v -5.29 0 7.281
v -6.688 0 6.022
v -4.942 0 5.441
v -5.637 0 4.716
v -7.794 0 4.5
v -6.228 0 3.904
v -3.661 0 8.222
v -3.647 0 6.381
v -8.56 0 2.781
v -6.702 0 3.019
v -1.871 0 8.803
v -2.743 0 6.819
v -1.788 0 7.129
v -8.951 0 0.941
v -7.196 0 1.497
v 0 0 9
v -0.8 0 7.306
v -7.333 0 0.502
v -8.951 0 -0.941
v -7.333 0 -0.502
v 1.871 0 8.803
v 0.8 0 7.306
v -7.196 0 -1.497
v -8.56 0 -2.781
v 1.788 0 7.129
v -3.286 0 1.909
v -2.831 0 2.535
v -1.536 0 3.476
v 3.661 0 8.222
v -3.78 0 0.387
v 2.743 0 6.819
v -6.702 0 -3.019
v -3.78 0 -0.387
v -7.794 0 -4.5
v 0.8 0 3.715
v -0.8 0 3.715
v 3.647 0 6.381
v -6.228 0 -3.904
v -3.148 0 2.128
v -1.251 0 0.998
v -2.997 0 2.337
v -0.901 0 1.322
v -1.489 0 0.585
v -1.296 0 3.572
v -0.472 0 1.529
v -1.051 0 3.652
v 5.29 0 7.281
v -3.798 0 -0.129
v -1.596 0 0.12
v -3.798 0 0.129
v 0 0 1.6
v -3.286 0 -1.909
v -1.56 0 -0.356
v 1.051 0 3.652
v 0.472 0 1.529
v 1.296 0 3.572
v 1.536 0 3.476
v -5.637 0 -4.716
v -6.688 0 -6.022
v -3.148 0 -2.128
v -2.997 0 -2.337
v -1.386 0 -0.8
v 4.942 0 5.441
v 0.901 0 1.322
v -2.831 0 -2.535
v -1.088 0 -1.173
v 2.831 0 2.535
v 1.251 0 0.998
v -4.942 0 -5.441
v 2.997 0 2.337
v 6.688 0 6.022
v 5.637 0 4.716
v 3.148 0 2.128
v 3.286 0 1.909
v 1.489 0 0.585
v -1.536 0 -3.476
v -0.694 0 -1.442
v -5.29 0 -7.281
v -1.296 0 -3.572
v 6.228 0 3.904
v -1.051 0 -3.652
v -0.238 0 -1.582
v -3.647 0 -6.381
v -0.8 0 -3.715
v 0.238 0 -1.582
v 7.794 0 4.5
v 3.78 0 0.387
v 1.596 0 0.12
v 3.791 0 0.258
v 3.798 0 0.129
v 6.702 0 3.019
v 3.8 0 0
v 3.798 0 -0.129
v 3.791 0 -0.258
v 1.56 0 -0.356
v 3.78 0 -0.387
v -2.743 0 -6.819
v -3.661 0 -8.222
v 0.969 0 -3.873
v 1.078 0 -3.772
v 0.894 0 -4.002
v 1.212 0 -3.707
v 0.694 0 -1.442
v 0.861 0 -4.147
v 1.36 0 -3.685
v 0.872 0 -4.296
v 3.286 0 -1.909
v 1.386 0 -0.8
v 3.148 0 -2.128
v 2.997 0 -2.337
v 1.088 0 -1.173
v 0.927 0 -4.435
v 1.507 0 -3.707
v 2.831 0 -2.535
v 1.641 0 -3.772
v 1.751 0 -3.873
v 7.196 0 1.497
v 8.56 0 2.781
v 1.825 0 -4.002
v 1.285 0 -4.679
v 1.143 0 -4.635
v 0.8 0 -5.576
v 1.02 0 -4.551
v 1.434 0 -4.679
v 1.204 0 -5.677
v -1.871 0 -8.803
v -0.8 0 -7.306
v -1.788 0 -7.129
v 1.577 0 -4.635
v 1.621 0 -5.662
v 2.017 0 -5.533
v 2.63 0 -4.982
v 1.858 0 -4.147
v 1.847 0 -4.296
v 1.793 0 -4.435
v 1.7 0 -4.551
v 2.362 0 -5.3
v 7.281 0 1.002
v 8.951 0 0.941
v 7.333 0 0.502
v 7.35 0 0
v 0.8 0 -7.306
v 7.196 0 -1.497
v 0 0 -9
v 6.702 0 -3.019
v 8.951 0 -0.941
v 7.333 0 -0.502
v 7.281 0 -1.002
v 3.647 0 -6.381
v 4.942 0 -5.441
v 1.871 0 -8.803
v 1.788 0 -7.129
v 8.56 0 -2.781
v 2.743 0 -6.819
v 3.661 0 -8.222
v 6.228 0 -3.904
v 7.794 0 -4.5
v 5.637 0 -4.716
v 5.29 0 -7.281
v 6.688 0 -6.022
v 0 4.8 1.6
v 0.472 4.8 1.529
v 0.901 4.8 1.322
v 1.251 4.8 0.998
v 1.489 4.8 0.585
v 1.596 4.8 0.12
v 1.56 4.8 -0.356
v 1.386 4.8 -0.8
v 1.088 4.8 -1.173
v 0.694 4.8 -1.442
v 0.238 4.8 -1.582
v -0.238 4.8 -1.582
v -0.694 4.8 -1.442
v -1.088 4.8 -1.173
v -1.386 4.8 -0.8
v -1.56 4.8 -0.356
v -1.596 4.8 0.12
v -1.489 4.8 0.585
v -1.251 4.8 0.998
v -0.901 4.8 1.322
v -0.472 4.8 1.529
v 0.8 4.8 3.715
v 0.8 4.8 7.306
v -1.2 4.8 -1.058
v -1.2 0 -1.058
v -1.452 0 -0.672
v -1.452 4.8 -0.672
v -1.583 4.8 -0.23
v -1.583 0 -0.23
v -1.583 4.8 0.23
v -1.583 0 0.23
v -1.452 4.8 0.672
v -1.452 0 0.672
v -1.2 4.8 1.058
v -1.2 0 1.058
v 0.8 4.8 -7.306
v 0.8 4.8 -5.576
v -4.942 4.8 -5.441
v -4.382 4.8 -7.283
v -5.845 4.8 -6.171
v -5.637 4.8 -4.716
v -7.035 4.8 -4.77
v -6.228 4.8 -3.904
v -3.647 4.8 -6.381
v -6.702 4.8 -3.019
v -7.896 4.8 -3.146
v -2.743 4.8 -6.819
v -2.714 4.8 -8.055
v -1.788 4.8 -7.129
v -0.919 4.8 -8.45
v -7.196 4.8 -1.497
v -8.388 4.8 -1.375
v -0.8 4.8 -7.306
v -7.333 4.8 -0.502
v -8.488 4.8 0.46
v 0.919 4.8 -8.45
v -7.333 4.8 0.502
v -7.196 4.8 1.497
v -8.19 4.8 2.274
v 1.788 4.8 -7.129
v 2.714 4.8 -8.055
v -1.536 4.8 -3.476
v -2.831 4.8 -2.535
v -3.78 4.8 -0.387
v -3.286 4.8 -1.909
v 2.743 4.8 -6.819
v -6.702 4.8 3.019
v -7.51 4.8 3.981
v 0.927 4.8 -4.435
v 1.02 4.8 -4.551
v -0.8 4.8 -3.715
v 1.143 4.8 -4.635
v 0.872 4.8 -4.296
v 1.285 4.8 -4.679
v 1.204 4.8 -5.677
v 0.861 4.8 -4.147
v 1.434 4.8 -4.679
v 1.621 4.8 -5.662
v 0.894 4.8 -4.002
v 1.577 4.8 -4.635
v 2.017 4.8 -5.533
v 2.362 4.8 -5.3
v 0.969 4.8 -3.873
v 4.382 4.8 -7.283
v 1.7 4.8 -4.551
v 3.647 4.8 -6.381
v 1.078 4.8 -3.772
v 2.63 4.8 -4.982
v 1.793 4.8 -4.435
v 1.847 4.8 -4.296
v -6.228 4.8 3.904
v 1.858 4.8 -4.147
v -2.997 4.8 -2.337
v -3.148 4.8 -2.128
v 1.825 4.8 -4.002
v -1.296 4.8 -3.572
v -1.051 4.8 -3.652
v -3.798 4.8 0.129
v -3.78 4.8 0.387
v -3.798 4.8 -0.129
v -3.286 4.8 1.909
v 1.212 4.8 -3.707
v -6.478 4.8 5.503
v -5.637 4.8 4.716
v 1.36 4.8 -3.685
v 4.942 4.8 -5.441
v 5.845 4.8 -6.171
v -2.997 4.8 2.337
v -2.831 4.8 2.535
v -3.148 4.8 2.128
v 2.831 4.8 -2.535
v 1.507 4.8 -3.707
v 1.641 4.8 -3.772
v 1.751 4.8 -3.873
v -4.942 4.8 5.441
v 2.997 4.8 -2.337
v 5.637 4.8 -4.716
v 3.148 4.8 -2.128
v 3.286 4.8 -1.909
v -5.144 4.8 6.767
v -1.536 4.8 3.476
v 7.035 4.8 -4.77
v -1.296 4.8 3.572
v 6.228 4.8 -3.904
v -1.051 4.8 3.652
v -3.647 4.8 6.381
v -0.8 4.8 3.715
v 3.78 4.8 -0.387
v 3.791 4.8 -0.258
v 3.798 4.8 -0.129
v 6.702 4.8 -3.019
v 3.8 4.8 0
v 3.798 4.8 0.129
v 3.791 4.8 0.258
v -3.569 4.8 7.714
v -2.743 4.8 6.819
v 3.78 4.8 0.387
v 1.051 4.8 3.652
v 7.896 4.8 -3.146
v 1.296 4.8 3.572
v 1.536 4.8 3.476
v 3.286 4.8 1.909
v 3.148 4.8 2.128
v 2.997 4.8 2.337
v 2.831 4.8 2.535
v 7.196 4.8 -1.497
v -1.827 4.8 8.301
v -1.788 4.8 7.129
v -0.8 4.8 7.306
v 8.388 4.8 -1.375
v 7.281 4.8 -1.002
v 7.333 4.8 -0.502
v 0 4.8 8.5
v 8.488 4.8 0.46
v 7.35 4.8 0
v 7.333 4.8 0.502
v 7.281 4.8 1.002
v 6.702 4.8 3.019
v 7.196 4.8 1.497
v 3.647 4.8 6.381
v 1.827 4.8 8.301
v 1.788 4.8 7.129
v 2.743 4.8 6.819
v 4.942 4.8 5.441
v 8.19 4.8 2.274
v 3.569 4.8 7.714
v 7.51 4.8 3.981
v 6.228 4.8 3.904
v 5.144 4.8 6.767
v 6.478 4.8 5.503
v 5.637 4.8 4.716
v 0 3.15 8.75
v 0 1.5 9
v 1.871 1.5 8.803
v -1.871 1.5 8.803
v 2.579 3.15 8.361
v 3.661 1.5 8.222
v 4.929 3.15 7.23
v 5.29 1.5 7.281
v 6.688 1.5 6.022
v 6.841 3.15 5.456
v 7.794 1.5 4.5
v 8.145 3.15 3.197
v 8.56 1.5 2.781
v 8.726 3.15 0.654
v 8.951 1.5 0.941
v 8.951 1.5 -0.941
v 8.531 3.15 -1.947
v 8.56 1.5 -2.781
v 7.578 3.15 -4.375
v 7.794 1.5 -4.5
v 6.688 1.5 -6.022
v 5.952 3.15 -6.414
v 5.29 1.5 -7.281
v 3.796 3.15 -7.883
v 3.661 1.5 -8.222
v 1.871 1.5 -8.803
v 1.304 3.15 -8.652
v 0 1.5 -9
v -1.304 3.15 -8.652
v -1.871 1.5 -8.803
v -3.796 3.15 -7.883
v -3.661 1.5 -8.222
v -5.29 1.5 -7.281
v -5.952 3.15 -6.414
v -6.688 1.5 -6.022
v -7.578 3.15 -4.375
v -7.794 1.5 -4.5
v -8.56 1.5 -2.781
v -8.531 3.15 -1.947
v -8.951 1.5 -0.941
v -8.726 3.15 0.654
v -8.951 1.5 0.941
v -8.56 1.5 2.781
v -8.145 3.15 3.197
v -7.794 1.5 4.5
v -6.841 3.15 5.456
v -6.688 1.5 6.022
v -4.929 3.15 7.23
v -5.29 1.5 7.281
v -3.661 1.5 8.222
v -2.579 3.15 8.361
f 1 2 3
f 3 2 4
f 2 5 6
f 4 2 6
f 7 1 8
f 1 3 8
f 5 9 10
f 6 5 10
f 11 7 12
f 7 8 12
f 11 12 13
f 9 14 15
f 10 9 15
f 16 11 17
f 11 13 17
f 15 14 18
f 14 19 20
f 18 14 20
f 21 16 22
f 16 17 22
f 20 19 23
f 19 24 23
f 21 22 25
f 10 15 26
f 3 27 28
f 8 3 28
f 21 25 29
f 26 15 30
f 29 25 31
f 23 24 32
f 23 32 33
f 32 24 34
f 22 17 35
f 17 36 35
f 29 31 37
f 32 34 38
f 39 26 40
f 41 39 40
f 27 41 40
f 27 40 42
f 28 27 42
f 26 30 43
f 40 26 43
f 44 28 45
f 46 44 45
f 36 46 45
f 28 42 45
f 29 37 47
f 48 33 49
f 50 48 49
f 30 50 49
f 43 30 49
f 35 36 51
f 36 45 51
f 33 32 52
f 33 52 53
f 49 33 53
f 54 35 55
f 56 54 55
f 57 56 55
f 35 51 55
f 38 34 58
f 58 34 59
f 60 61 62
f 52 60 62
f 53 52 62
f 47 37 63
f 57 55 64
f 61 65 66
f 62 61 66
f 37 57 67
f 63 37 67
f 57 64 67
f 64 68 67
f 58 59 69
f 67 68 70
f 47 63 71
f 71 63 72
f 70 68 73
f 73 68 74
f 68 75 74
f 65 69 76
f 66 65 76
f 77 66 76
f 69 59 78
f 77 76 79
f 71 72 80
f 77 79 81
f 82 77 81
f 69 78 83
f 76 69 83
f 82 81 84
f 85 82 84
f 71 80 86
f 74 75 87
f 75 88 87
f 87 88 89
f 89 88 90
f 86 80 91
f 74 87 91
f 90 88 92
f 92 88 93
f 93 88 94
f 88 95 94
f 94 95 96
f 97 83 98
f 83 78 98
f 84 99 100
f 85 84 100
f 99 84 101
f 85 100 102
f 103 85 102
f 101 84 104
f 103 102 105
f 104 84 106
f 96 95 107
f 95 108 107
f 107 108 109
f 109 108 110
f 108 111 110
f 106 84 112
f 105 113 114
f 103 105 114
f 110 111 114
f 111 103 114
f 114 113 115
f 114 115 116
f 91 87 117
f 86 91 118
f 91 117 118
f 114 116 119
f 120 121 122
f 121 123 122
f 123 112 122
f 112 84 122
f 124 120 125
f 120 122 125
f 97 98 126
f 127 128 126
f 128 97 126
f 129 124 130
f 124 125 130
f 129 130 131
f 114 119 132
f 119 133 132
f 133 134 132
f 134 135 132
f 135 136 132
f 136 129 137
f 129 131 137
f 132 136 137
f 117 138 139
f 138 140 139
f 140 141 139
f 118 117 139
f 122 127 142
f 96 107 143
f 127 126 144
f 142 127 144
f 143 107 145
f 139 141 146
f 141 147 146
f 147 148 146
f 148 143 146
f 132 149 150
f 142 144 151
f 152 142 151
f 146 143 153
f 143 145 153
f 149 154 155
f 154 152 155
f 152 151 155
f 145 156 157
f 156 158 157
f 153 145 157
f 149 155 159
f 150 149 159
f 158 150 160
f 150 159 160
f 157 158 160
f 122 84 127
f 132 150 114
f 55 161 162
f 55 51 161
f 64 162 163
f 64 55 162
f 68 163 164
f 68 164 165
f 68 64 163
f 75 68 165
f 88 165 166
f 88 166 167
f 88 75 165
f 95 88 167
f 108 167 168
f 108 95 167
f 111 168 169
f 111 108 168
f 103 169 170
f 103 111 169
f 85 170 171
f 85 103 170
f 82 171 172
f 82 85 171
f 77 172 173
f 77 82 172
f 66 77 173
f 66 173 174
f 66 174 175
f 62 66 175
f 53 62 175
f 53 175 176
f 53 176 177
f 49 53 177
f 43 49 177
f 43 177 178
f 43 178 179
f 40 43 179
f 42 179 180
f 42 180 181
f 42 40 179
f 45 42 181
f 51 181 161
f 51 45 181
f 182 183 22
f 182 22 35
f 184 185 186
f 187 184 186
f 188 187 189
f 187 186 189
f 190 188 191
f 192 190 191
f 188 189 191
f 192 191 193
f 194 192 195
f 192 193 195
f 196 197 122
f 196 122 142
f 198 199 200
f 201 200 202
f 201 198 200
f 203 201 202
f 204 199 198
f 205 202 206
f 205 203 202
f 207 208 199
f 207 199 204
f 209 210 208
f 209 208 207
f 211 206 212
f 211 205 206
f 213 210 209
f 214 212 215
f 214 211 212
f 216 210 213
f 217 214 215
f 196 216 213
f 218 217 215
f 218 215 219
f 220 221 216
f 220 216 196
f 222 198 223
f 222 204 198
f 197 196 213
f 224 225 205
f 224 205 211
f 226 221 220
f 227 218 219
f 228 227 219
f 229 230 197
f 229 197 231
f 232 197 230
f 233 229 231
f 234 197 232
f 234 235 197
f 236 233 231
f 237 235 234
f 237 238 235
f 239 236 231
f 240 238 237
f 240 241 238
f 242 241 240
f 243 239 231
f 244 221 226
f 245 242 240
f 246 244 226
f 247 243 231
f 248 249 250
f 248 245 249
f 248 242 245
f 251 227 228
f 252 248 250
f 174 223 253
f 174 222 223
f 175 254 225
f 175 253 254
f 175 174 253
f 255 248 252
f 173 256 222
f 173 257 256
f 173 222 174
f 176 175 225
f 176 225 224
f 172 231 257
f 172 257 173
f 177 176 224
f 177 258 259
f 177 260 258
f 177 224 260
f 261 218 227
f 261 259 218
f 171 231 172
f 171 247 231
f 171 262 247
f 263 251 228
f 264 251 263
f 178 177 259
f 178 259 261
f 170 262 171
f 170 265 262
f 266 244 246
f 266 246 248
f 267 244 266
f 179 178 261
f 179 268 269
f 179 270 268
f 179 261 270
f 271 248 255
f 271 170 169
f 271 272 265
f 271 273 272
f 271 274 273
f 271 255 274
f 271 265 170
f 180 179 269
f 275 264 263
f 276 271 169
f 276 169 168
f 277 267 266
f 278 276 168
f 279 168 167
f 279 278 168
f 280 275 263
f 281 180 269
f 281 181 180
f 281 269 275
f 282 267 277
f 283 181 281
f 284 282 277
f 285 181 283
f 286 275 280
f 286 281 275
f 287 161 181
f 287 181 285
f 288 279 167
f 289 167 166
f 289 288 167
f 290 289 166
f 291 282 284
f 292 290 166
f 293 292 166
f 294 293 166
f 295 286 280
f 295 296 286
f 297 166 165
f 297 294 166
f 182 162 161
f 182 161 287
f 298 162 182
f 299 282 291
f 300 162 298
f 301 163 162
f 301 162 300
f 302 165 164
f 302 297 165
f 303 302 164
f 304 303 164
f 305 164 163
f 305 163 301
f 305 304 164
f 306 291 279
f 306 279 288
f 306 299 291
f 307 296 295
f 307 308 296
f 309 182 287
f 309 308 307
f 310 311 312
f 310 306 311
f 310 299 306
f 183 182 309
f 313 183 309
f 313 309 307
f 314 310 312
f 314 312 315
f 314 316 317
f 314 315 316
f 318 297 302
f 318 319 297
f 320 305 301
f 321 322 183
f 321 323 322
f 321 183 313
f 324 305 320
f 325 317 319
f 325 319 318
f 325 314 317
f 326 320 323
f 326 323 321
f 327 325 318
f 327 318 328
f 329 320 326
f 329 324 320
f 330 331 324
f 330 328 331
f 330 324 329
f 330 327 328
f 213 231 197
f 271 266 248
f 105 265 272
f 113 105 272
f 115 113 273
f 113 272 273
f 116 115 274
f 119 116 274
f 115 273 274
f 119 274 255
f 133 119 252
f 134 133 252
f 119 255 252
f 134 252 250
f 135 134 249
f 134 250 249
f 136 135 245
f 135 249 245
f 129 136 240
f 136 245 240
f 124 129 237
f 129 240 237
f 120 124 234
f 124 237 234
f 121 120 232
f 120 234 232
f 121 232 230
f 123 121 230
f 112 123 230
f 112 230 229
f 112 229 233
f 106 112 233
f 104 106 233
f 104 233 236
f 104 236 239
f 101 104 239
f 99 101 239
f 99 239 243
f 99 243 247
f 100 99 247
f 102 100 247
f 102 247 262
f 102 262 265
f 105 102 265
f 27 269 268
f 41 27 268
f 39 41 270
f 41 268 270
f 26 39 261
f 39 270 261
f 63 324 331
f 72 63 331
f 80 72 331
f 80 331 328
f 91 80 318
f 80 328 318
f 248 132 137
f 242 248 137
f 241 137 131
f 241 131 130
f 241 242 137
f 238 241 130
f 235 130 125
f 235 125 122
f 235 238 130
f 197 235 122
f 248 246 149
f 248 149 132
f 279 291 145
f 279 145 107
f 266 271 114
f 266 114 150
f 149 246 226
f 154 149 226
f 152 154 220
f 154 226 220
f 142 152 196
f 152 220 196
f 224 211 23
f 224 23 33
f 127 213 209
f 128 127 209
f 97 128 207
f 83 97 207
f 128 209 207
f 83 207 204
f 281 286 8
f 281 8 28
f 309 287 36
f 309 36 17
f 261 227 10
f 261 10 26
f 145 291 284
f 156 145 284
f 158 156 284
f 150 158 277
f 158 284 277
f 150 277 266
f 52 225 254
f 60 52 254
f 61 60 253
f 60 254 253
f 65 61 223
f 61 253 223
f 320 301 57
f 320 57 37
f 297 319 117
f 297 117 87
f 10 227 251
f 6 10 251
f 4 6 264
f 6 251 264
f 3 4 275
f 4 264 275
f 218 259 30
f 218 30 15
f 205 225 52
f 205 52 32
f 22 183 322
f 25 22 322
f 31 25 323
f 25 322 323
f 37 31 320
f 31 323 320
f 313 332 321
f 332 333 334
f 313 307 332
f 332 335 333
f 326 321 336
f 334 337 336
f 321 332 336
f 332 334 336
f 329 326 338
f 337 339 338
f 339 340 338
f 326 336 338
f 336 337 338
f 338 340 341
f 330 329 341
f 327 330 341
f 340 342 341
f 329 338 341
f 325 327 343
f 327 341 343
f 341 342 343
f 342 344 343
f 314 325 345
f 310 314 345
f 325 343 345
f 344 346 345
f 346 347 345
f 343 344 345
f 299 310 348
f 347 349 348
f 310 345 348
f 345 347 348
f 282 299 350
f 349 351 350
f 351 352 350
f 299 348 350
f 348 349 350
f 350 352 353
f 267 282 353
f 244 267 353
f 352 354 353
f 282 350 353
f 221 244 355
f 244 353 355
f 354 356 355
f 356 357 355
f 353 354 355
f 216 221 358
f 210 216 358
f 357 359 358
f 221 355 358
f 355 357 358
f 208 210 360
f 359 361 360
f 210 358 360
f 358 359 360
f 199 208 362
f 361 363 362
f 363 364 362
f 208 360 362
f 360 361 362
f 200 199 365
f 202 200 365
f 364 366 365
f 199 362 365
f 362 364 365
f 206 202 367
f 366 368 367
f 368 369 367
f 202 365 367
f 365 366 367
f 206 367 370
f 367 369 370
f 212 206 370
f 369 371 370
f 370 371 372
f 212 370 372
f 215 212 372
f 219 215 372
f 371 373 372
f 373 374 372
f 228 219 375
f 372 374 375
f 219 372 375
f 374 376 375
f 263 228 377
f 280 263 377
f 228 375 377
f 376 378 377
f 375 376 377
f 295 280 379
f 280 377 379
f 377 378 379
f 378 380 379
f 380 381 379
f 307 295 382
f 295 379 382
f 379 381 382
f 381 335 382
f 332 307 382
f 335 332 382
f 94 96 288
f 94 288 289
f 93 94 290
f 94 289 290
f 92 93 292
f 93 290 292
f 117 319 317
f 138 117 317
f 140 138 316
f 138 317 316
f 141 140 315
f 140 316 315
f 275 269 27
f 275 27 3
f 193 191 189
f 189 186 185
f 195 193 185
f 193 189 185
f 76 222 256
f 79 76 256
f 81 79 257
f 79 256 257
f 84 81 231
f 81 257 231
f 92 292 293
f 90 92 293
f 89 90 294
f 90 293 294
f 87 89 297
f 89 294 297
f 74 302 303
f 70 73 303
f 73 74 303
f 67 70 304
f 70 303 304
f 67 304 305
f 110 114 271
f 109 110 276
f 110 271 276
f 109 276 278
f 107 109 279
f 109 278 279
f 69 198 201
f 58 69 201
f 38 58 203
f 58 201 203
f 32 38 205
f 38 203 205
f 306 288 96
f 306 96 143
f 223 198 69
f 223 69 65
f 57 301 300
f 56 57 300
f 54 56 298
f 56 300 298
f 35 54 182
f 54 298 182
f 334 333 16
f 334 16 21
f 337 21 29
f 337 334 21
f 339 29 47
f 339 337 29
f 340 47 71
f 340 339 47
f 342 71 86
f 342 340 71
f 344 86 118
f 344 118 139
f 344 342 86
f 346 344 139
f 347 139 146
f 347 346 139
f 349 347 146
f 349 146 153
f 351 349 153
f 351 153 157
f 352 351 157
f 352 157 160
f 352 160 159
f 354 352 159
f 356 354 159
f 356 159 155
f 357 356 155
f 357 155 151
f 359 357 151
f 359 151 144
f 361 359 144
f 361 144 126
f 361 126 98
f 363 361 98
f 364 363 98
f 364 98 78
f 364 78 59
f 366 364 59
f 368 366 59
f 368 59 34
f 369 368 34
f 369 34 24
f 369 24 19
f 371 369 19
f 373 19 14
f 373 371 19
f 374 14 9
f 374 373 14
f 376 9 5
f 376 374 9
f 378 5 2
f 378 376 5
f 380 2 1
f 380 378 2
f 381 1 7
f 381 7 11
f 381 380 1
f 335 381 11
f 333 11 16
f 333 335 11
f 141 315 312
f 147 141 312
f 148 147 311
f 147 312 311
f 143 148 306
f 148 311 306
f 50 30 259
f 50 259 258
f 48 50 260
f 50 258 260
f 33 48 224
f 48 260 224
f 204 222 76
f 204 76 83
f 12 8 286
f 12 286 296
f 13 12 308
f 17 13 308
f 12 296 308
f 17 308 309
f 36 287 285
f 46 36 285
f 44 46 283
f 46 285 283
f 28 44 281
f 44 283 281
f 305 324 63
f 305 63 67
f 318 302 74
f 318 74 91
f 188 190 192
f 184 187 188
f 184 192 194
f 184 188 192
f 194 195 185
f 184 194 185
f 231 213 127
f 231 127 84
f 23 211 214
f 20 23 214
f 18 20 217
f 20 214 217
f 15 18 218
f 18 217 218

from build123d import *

# Parameters (mm, degrees)
SKETCH_4_R               = 11.6
SKETCH_4_R_2             = 1.6
EXTRUDE_1_DEPTH          = 1.1
EXTRUDE_START            = 1.5
SKETCH_4_3_R             = 9
SKETCH_4_3_R_2           = 1.6
EXTRUDE_2_DEPTH          = 3.3
CHAMFER_1_SIZE           = 0.2
SKETCH_4_4_R             = 1.6
CUT_EXTRUDE_2_DEPTH      = 18.092688495
CHAMFER_2_SIZE           = 0.5
CHAMFER_2_SIZE_2         = 3.3
CUT_EXTRUDE_4_DEPTH      = 18.092688495
EXTRUDE_3_DEPTH          = 4.8
PATTERN_CIRCULAR_2_COUNT = 10
SKETCH_6_R               = 1.5
EXTRUDE_4_DEPTH          = 4.8
SKETCH_6_3_R             = 0.5
CUT_EXTRUDE_5_DEPTH      = 18.092688495
EXTRUDE_5_DEPTH          = 4.8
SKETCH_7_OUTSIDE_W       = 31.832
SKETCH_7_OUTSIDE_H       = 31.832
SKETCH_7_OUTSIDE_R       = 9
CUT_EXTRUDE_6_DEPTH      = 18.092688495


with BuildPart() as part:
    # 草图4 → 凸台-拉伸1 (new body)
    with BuildSketch(Plane(origin=(0, 0, 0), x_dir=(1, 0, 0), z_dir=(0, 1, 0))):
        with Locations(Location((0, 0, 0), (0, 0, 270))):
            Circle(SKETCH_4_R)
        with Locations(Location((0, 0, 0), (0, 0, 270))):
            Circle(SKETCH_4_R_2, mode=Mode.SUBTRACT)
    extrude(amount=EXTRUDE_1_DEPTH)

    # 倒角1
    chamfer_1_edges = [part.edges().sort_by_distance(p)[0] for p in [
        (0, 1.1, -11.6),
    ]]
    chamfer(chamfer_1_edges, length=CHAMFER_1_SIZE)


with BuildPart() as body_2:
    # 草图4<3> → 凸台-拉伸2 (new body)
    with BuildSketch(Plane(origin=(0, 0, 0), x_dir=(1, 0, 0), z_dir=(0, 1, 0)).offset(EXTRUDE_START)):
        with Locations(Location((0, 0, 0), (0, 0, 270))):
            Circle(SKETCH_4_3_R)
        with Locations(Location((0, 0, 0), (0, 0, 270))):
            Circle(SKETCH_4_3_R_2, mode=Mode.SUBTRACT)
    extrude(amount=EXTRUDE_2_DEPTH)


    add(part.part)  # loft_1 joins it to this body
    # loft up to a face of the part (loft_1)
    loft([Face(Wire([body_2.edges().sort_by_distance((-6.560717647, 1.5, -6.160923953))[0]])), Face(Wire([body_2.edges().sort_by_distance((8.310242353, 1.1, -7.803837008))[0]]))])

    # 草图4<4> → 切除-拉伸2 (cut, through all)
    with BuildSketch(Plane(origin=(0, 0, 0), x_dir=(1, 0, 0), z_dir=(0, 1, 0))):
        with Locations(Location((0, 0, 0), (0, 0, 270))):
            Circle(SKETCH_4_4_R)
    extrude(amount=CUT_EXTRUDE_2_DEPTH, mode=Mode.SUBTRACT)

    # 倒角2
    # the kernel refuses this chamfer: 3.3, 0.5 mm, written as the material it takes off along each edge
    with BuildSketch(Plane(origin=(0, 4.8, 0), x_dir=(0, 0, 1), z_dir=(-1, 0, 0))) as chamfer_2_piece_1:
        Polygon((9 - CHAMFER_2_SIZE, 0), (9, -CHAMFER_2_SIZE_2), (9, 0), align=None)
    revolve(axis=Axis((0, 4.8, 0), (0, 1, 0)), mode=Mode.SUBTRACT)

    # 草图5 → 切除-拉伸4 (cut, through all)
    with BuildSketch(Plane(origin=(0, 4.8, 0), x_dir=(1, 0, 0), z_dir=(0, 1, 0))):
        with BuildLine():
            ThreePointArc((3.8, 0), (-2.387467277, -2.9563491), (-0.8, 3.714835124))
            Line((-0.8, 3.714835124), (-0.8, 7.30633287))
            ThreePointArc((-0.8, 7.30633287), (-4.906246019, -5.47277352), (7.35, 0))
            ThreePointArc((7.35, 0), (5.47277352, 4.906246019), (0.8, 7.30633287))
            Line((0.8, 7.30633287), (0.8, 3.714835124))
            ThreePointArc((0.8, 3.714835124), (2.9563491, 2.387467277), (3.8, 0))
        make_face()
        with BuildLine():
            Line((-0.8, 7.30633287), (-0.8, 3.714835124))
            ThreePointArc((-0.8, 3.714835124), (-0.402260194, 3.778648798), (0, 3.8))
            Line((0, 3.8), (0, 7.35))
            ThreePointArc((0, 7.35), (-0.400595438, 7.339075098), (-0.8, 7.30633287))
        make_face()
        with BuildLine():
            Line((0, 7.35), (0, 3.8))
            ThreePointArc((0, 3.8), (0.402260194, 3.778648798), (0.8, 3.714835124))
            Line((0.8, 3.714835124), (0.8, 7.30633287))
            ThreePointArc((0.8, 7.30633287), (0.400595438, 7.339075098), (0, 7.35))
        make_face()
    extrude(amount=-CUT_EXTRUDE_4_DEPTH, mode=Mode.SUBTRACT)


with BuildPart() as cut_extrude_4_piece_1:
    # of the separate pieces the step leaves, piece 1, a body of its own (cut_extrude_4_pieces)
    add(body_2.part.solids().sort_by_distance((0, 0.9, 11.6))[0])

    # 草图5<4> → 凸台-拉伸3 (add)
    with BuildSketch(Plane(origin=(0, 4.8, 0), x_dir=(1, 0, 0), z_dir=(0, 1, 0))):
        with BuildLine():
            Line((0, 7.35), (0, 3.8))
            ThreePointArc((0, 3.8), (0.402260194, 3.778648798), (0.8, 3.714835124))
            Line((0.8, 3.714835124), (0.8, 7.30633287))
            ThreePointArc((0.8, 7.30633287), (0.400595438, 7.339075098), (0, 7.35))
        make_face()
        with BuildLine():
            Line((-0.8, 7.30633287), (-0.8, 3.714835124))
            ThreePointArc((-0.8, 3.714835124), (-0.402260194, 3.778648798), (0, 3.8))
            Line((0, 3.8), (0, 7.35))
            ThreePointArc((0, 7.35), (-0.400595438, 7.339075098), (-0.8, 7.30633287))
        make_face()
    extrude_3 = extrude(amount=-EXTRUDE_3_DEPTH)

    # 阵列(圆周)2: 凸台-拉伸3 ×10 about axis
    pattern_circular_2_axis = Axis((0, 0, 0), (0, 1, 0))
    for i in range(1, PATTERN_CIRCULAR_2_COUNT):
        add(extrude_3.rotate(pattern_circular_2_axis, i * 360 / PATTERN_CIRCULAR_2_COUNT))



with BuildPart() as cut_extrude_4_piece_2:
    # of the separate pieces the step leaves, piece 2, a body of its own (cut_extrude_4_pieces)
    add(body_2.part.solids().sort_by_distance((-0.8, 0, -3.714835124))[0])


with BuildPart() as cut_extrude_4_piece_1_1:
    add(cut_extrude_4_piece_1.part)

    add(cut_extrude_4_piece_2.part)  # 凸台-拉伸4 merges 切除-拉伸4 piece 2
    # 草图6 → 凸台-拉伸4 (add, through all)
    with BuildSketch(Plane(origin=(0, 4.8, 0), x_dir=(1, 0, 0), z_dir=(0, 1, 0))):
        with Locations((1.359674775, 4.184648672)):
            Circle(SKETCH_6_R)
    extrude(amount=-EXTRUDE_4_DEPTH)

    # 草图6<3> → 切除-拉伸5 (cut, through all)
    with BuildSketch(Plane(origin=(0, 4.8, 0), x_dir=(1, 0, 0), z_dir=(0, 1, 0))):
        with Locations(Location((1.359674775, 4.184648672, 0), (0, 0, 270))):
            Circle(SKETCH_6_3_R)
    extrude(amount=-CUT_EXTRUDE_5_DEPTH, mode=Mode.SUBTRACT)

    # 草图7 outside → 切除-拉伸6 (cut, through all)
    with BuildSketch(Plane(origin=(0, 4.8, 0), x_dir=(1, 0, 0), z_dir=(0, 1, 0))):
        Rectangle(SKETCH_7_OUTSIDE_W, SKETCH_7_OUTSIDE_H)
        with Locations(Location((0, 0, 0), (0, 0, 270))):
            Circle(SKETCH_7_OUTSIDE_R, mode=Mode.SUBTRACT)
    extrude(amount=-CUT_EXTRUDE_6_DEPTH, mode=Mode.SUBTRACT)


with BuildPart() as body_2_2:
    # 草图4<6> → 凸台-拉伸5 (new body)
    with BuildSketch(Plane(origin=(0, 0, 0), x_dir=(1, 0, 0), z_dir=(0, 1, 0))):
        with BuildLine():
            Line((-1.2, -1.058300524), (-1.2, 1.058300524))
            ThreePointArc((-1.2, 1.058300524), (-1.6, 0), (-1.2, -1.058300524))
        make_face()
    extrude(amount=EXTRUDE_5_DEPTH)


solid = Compound([cut_extrude_4_piece_1_1.part, body_2_2.part])
